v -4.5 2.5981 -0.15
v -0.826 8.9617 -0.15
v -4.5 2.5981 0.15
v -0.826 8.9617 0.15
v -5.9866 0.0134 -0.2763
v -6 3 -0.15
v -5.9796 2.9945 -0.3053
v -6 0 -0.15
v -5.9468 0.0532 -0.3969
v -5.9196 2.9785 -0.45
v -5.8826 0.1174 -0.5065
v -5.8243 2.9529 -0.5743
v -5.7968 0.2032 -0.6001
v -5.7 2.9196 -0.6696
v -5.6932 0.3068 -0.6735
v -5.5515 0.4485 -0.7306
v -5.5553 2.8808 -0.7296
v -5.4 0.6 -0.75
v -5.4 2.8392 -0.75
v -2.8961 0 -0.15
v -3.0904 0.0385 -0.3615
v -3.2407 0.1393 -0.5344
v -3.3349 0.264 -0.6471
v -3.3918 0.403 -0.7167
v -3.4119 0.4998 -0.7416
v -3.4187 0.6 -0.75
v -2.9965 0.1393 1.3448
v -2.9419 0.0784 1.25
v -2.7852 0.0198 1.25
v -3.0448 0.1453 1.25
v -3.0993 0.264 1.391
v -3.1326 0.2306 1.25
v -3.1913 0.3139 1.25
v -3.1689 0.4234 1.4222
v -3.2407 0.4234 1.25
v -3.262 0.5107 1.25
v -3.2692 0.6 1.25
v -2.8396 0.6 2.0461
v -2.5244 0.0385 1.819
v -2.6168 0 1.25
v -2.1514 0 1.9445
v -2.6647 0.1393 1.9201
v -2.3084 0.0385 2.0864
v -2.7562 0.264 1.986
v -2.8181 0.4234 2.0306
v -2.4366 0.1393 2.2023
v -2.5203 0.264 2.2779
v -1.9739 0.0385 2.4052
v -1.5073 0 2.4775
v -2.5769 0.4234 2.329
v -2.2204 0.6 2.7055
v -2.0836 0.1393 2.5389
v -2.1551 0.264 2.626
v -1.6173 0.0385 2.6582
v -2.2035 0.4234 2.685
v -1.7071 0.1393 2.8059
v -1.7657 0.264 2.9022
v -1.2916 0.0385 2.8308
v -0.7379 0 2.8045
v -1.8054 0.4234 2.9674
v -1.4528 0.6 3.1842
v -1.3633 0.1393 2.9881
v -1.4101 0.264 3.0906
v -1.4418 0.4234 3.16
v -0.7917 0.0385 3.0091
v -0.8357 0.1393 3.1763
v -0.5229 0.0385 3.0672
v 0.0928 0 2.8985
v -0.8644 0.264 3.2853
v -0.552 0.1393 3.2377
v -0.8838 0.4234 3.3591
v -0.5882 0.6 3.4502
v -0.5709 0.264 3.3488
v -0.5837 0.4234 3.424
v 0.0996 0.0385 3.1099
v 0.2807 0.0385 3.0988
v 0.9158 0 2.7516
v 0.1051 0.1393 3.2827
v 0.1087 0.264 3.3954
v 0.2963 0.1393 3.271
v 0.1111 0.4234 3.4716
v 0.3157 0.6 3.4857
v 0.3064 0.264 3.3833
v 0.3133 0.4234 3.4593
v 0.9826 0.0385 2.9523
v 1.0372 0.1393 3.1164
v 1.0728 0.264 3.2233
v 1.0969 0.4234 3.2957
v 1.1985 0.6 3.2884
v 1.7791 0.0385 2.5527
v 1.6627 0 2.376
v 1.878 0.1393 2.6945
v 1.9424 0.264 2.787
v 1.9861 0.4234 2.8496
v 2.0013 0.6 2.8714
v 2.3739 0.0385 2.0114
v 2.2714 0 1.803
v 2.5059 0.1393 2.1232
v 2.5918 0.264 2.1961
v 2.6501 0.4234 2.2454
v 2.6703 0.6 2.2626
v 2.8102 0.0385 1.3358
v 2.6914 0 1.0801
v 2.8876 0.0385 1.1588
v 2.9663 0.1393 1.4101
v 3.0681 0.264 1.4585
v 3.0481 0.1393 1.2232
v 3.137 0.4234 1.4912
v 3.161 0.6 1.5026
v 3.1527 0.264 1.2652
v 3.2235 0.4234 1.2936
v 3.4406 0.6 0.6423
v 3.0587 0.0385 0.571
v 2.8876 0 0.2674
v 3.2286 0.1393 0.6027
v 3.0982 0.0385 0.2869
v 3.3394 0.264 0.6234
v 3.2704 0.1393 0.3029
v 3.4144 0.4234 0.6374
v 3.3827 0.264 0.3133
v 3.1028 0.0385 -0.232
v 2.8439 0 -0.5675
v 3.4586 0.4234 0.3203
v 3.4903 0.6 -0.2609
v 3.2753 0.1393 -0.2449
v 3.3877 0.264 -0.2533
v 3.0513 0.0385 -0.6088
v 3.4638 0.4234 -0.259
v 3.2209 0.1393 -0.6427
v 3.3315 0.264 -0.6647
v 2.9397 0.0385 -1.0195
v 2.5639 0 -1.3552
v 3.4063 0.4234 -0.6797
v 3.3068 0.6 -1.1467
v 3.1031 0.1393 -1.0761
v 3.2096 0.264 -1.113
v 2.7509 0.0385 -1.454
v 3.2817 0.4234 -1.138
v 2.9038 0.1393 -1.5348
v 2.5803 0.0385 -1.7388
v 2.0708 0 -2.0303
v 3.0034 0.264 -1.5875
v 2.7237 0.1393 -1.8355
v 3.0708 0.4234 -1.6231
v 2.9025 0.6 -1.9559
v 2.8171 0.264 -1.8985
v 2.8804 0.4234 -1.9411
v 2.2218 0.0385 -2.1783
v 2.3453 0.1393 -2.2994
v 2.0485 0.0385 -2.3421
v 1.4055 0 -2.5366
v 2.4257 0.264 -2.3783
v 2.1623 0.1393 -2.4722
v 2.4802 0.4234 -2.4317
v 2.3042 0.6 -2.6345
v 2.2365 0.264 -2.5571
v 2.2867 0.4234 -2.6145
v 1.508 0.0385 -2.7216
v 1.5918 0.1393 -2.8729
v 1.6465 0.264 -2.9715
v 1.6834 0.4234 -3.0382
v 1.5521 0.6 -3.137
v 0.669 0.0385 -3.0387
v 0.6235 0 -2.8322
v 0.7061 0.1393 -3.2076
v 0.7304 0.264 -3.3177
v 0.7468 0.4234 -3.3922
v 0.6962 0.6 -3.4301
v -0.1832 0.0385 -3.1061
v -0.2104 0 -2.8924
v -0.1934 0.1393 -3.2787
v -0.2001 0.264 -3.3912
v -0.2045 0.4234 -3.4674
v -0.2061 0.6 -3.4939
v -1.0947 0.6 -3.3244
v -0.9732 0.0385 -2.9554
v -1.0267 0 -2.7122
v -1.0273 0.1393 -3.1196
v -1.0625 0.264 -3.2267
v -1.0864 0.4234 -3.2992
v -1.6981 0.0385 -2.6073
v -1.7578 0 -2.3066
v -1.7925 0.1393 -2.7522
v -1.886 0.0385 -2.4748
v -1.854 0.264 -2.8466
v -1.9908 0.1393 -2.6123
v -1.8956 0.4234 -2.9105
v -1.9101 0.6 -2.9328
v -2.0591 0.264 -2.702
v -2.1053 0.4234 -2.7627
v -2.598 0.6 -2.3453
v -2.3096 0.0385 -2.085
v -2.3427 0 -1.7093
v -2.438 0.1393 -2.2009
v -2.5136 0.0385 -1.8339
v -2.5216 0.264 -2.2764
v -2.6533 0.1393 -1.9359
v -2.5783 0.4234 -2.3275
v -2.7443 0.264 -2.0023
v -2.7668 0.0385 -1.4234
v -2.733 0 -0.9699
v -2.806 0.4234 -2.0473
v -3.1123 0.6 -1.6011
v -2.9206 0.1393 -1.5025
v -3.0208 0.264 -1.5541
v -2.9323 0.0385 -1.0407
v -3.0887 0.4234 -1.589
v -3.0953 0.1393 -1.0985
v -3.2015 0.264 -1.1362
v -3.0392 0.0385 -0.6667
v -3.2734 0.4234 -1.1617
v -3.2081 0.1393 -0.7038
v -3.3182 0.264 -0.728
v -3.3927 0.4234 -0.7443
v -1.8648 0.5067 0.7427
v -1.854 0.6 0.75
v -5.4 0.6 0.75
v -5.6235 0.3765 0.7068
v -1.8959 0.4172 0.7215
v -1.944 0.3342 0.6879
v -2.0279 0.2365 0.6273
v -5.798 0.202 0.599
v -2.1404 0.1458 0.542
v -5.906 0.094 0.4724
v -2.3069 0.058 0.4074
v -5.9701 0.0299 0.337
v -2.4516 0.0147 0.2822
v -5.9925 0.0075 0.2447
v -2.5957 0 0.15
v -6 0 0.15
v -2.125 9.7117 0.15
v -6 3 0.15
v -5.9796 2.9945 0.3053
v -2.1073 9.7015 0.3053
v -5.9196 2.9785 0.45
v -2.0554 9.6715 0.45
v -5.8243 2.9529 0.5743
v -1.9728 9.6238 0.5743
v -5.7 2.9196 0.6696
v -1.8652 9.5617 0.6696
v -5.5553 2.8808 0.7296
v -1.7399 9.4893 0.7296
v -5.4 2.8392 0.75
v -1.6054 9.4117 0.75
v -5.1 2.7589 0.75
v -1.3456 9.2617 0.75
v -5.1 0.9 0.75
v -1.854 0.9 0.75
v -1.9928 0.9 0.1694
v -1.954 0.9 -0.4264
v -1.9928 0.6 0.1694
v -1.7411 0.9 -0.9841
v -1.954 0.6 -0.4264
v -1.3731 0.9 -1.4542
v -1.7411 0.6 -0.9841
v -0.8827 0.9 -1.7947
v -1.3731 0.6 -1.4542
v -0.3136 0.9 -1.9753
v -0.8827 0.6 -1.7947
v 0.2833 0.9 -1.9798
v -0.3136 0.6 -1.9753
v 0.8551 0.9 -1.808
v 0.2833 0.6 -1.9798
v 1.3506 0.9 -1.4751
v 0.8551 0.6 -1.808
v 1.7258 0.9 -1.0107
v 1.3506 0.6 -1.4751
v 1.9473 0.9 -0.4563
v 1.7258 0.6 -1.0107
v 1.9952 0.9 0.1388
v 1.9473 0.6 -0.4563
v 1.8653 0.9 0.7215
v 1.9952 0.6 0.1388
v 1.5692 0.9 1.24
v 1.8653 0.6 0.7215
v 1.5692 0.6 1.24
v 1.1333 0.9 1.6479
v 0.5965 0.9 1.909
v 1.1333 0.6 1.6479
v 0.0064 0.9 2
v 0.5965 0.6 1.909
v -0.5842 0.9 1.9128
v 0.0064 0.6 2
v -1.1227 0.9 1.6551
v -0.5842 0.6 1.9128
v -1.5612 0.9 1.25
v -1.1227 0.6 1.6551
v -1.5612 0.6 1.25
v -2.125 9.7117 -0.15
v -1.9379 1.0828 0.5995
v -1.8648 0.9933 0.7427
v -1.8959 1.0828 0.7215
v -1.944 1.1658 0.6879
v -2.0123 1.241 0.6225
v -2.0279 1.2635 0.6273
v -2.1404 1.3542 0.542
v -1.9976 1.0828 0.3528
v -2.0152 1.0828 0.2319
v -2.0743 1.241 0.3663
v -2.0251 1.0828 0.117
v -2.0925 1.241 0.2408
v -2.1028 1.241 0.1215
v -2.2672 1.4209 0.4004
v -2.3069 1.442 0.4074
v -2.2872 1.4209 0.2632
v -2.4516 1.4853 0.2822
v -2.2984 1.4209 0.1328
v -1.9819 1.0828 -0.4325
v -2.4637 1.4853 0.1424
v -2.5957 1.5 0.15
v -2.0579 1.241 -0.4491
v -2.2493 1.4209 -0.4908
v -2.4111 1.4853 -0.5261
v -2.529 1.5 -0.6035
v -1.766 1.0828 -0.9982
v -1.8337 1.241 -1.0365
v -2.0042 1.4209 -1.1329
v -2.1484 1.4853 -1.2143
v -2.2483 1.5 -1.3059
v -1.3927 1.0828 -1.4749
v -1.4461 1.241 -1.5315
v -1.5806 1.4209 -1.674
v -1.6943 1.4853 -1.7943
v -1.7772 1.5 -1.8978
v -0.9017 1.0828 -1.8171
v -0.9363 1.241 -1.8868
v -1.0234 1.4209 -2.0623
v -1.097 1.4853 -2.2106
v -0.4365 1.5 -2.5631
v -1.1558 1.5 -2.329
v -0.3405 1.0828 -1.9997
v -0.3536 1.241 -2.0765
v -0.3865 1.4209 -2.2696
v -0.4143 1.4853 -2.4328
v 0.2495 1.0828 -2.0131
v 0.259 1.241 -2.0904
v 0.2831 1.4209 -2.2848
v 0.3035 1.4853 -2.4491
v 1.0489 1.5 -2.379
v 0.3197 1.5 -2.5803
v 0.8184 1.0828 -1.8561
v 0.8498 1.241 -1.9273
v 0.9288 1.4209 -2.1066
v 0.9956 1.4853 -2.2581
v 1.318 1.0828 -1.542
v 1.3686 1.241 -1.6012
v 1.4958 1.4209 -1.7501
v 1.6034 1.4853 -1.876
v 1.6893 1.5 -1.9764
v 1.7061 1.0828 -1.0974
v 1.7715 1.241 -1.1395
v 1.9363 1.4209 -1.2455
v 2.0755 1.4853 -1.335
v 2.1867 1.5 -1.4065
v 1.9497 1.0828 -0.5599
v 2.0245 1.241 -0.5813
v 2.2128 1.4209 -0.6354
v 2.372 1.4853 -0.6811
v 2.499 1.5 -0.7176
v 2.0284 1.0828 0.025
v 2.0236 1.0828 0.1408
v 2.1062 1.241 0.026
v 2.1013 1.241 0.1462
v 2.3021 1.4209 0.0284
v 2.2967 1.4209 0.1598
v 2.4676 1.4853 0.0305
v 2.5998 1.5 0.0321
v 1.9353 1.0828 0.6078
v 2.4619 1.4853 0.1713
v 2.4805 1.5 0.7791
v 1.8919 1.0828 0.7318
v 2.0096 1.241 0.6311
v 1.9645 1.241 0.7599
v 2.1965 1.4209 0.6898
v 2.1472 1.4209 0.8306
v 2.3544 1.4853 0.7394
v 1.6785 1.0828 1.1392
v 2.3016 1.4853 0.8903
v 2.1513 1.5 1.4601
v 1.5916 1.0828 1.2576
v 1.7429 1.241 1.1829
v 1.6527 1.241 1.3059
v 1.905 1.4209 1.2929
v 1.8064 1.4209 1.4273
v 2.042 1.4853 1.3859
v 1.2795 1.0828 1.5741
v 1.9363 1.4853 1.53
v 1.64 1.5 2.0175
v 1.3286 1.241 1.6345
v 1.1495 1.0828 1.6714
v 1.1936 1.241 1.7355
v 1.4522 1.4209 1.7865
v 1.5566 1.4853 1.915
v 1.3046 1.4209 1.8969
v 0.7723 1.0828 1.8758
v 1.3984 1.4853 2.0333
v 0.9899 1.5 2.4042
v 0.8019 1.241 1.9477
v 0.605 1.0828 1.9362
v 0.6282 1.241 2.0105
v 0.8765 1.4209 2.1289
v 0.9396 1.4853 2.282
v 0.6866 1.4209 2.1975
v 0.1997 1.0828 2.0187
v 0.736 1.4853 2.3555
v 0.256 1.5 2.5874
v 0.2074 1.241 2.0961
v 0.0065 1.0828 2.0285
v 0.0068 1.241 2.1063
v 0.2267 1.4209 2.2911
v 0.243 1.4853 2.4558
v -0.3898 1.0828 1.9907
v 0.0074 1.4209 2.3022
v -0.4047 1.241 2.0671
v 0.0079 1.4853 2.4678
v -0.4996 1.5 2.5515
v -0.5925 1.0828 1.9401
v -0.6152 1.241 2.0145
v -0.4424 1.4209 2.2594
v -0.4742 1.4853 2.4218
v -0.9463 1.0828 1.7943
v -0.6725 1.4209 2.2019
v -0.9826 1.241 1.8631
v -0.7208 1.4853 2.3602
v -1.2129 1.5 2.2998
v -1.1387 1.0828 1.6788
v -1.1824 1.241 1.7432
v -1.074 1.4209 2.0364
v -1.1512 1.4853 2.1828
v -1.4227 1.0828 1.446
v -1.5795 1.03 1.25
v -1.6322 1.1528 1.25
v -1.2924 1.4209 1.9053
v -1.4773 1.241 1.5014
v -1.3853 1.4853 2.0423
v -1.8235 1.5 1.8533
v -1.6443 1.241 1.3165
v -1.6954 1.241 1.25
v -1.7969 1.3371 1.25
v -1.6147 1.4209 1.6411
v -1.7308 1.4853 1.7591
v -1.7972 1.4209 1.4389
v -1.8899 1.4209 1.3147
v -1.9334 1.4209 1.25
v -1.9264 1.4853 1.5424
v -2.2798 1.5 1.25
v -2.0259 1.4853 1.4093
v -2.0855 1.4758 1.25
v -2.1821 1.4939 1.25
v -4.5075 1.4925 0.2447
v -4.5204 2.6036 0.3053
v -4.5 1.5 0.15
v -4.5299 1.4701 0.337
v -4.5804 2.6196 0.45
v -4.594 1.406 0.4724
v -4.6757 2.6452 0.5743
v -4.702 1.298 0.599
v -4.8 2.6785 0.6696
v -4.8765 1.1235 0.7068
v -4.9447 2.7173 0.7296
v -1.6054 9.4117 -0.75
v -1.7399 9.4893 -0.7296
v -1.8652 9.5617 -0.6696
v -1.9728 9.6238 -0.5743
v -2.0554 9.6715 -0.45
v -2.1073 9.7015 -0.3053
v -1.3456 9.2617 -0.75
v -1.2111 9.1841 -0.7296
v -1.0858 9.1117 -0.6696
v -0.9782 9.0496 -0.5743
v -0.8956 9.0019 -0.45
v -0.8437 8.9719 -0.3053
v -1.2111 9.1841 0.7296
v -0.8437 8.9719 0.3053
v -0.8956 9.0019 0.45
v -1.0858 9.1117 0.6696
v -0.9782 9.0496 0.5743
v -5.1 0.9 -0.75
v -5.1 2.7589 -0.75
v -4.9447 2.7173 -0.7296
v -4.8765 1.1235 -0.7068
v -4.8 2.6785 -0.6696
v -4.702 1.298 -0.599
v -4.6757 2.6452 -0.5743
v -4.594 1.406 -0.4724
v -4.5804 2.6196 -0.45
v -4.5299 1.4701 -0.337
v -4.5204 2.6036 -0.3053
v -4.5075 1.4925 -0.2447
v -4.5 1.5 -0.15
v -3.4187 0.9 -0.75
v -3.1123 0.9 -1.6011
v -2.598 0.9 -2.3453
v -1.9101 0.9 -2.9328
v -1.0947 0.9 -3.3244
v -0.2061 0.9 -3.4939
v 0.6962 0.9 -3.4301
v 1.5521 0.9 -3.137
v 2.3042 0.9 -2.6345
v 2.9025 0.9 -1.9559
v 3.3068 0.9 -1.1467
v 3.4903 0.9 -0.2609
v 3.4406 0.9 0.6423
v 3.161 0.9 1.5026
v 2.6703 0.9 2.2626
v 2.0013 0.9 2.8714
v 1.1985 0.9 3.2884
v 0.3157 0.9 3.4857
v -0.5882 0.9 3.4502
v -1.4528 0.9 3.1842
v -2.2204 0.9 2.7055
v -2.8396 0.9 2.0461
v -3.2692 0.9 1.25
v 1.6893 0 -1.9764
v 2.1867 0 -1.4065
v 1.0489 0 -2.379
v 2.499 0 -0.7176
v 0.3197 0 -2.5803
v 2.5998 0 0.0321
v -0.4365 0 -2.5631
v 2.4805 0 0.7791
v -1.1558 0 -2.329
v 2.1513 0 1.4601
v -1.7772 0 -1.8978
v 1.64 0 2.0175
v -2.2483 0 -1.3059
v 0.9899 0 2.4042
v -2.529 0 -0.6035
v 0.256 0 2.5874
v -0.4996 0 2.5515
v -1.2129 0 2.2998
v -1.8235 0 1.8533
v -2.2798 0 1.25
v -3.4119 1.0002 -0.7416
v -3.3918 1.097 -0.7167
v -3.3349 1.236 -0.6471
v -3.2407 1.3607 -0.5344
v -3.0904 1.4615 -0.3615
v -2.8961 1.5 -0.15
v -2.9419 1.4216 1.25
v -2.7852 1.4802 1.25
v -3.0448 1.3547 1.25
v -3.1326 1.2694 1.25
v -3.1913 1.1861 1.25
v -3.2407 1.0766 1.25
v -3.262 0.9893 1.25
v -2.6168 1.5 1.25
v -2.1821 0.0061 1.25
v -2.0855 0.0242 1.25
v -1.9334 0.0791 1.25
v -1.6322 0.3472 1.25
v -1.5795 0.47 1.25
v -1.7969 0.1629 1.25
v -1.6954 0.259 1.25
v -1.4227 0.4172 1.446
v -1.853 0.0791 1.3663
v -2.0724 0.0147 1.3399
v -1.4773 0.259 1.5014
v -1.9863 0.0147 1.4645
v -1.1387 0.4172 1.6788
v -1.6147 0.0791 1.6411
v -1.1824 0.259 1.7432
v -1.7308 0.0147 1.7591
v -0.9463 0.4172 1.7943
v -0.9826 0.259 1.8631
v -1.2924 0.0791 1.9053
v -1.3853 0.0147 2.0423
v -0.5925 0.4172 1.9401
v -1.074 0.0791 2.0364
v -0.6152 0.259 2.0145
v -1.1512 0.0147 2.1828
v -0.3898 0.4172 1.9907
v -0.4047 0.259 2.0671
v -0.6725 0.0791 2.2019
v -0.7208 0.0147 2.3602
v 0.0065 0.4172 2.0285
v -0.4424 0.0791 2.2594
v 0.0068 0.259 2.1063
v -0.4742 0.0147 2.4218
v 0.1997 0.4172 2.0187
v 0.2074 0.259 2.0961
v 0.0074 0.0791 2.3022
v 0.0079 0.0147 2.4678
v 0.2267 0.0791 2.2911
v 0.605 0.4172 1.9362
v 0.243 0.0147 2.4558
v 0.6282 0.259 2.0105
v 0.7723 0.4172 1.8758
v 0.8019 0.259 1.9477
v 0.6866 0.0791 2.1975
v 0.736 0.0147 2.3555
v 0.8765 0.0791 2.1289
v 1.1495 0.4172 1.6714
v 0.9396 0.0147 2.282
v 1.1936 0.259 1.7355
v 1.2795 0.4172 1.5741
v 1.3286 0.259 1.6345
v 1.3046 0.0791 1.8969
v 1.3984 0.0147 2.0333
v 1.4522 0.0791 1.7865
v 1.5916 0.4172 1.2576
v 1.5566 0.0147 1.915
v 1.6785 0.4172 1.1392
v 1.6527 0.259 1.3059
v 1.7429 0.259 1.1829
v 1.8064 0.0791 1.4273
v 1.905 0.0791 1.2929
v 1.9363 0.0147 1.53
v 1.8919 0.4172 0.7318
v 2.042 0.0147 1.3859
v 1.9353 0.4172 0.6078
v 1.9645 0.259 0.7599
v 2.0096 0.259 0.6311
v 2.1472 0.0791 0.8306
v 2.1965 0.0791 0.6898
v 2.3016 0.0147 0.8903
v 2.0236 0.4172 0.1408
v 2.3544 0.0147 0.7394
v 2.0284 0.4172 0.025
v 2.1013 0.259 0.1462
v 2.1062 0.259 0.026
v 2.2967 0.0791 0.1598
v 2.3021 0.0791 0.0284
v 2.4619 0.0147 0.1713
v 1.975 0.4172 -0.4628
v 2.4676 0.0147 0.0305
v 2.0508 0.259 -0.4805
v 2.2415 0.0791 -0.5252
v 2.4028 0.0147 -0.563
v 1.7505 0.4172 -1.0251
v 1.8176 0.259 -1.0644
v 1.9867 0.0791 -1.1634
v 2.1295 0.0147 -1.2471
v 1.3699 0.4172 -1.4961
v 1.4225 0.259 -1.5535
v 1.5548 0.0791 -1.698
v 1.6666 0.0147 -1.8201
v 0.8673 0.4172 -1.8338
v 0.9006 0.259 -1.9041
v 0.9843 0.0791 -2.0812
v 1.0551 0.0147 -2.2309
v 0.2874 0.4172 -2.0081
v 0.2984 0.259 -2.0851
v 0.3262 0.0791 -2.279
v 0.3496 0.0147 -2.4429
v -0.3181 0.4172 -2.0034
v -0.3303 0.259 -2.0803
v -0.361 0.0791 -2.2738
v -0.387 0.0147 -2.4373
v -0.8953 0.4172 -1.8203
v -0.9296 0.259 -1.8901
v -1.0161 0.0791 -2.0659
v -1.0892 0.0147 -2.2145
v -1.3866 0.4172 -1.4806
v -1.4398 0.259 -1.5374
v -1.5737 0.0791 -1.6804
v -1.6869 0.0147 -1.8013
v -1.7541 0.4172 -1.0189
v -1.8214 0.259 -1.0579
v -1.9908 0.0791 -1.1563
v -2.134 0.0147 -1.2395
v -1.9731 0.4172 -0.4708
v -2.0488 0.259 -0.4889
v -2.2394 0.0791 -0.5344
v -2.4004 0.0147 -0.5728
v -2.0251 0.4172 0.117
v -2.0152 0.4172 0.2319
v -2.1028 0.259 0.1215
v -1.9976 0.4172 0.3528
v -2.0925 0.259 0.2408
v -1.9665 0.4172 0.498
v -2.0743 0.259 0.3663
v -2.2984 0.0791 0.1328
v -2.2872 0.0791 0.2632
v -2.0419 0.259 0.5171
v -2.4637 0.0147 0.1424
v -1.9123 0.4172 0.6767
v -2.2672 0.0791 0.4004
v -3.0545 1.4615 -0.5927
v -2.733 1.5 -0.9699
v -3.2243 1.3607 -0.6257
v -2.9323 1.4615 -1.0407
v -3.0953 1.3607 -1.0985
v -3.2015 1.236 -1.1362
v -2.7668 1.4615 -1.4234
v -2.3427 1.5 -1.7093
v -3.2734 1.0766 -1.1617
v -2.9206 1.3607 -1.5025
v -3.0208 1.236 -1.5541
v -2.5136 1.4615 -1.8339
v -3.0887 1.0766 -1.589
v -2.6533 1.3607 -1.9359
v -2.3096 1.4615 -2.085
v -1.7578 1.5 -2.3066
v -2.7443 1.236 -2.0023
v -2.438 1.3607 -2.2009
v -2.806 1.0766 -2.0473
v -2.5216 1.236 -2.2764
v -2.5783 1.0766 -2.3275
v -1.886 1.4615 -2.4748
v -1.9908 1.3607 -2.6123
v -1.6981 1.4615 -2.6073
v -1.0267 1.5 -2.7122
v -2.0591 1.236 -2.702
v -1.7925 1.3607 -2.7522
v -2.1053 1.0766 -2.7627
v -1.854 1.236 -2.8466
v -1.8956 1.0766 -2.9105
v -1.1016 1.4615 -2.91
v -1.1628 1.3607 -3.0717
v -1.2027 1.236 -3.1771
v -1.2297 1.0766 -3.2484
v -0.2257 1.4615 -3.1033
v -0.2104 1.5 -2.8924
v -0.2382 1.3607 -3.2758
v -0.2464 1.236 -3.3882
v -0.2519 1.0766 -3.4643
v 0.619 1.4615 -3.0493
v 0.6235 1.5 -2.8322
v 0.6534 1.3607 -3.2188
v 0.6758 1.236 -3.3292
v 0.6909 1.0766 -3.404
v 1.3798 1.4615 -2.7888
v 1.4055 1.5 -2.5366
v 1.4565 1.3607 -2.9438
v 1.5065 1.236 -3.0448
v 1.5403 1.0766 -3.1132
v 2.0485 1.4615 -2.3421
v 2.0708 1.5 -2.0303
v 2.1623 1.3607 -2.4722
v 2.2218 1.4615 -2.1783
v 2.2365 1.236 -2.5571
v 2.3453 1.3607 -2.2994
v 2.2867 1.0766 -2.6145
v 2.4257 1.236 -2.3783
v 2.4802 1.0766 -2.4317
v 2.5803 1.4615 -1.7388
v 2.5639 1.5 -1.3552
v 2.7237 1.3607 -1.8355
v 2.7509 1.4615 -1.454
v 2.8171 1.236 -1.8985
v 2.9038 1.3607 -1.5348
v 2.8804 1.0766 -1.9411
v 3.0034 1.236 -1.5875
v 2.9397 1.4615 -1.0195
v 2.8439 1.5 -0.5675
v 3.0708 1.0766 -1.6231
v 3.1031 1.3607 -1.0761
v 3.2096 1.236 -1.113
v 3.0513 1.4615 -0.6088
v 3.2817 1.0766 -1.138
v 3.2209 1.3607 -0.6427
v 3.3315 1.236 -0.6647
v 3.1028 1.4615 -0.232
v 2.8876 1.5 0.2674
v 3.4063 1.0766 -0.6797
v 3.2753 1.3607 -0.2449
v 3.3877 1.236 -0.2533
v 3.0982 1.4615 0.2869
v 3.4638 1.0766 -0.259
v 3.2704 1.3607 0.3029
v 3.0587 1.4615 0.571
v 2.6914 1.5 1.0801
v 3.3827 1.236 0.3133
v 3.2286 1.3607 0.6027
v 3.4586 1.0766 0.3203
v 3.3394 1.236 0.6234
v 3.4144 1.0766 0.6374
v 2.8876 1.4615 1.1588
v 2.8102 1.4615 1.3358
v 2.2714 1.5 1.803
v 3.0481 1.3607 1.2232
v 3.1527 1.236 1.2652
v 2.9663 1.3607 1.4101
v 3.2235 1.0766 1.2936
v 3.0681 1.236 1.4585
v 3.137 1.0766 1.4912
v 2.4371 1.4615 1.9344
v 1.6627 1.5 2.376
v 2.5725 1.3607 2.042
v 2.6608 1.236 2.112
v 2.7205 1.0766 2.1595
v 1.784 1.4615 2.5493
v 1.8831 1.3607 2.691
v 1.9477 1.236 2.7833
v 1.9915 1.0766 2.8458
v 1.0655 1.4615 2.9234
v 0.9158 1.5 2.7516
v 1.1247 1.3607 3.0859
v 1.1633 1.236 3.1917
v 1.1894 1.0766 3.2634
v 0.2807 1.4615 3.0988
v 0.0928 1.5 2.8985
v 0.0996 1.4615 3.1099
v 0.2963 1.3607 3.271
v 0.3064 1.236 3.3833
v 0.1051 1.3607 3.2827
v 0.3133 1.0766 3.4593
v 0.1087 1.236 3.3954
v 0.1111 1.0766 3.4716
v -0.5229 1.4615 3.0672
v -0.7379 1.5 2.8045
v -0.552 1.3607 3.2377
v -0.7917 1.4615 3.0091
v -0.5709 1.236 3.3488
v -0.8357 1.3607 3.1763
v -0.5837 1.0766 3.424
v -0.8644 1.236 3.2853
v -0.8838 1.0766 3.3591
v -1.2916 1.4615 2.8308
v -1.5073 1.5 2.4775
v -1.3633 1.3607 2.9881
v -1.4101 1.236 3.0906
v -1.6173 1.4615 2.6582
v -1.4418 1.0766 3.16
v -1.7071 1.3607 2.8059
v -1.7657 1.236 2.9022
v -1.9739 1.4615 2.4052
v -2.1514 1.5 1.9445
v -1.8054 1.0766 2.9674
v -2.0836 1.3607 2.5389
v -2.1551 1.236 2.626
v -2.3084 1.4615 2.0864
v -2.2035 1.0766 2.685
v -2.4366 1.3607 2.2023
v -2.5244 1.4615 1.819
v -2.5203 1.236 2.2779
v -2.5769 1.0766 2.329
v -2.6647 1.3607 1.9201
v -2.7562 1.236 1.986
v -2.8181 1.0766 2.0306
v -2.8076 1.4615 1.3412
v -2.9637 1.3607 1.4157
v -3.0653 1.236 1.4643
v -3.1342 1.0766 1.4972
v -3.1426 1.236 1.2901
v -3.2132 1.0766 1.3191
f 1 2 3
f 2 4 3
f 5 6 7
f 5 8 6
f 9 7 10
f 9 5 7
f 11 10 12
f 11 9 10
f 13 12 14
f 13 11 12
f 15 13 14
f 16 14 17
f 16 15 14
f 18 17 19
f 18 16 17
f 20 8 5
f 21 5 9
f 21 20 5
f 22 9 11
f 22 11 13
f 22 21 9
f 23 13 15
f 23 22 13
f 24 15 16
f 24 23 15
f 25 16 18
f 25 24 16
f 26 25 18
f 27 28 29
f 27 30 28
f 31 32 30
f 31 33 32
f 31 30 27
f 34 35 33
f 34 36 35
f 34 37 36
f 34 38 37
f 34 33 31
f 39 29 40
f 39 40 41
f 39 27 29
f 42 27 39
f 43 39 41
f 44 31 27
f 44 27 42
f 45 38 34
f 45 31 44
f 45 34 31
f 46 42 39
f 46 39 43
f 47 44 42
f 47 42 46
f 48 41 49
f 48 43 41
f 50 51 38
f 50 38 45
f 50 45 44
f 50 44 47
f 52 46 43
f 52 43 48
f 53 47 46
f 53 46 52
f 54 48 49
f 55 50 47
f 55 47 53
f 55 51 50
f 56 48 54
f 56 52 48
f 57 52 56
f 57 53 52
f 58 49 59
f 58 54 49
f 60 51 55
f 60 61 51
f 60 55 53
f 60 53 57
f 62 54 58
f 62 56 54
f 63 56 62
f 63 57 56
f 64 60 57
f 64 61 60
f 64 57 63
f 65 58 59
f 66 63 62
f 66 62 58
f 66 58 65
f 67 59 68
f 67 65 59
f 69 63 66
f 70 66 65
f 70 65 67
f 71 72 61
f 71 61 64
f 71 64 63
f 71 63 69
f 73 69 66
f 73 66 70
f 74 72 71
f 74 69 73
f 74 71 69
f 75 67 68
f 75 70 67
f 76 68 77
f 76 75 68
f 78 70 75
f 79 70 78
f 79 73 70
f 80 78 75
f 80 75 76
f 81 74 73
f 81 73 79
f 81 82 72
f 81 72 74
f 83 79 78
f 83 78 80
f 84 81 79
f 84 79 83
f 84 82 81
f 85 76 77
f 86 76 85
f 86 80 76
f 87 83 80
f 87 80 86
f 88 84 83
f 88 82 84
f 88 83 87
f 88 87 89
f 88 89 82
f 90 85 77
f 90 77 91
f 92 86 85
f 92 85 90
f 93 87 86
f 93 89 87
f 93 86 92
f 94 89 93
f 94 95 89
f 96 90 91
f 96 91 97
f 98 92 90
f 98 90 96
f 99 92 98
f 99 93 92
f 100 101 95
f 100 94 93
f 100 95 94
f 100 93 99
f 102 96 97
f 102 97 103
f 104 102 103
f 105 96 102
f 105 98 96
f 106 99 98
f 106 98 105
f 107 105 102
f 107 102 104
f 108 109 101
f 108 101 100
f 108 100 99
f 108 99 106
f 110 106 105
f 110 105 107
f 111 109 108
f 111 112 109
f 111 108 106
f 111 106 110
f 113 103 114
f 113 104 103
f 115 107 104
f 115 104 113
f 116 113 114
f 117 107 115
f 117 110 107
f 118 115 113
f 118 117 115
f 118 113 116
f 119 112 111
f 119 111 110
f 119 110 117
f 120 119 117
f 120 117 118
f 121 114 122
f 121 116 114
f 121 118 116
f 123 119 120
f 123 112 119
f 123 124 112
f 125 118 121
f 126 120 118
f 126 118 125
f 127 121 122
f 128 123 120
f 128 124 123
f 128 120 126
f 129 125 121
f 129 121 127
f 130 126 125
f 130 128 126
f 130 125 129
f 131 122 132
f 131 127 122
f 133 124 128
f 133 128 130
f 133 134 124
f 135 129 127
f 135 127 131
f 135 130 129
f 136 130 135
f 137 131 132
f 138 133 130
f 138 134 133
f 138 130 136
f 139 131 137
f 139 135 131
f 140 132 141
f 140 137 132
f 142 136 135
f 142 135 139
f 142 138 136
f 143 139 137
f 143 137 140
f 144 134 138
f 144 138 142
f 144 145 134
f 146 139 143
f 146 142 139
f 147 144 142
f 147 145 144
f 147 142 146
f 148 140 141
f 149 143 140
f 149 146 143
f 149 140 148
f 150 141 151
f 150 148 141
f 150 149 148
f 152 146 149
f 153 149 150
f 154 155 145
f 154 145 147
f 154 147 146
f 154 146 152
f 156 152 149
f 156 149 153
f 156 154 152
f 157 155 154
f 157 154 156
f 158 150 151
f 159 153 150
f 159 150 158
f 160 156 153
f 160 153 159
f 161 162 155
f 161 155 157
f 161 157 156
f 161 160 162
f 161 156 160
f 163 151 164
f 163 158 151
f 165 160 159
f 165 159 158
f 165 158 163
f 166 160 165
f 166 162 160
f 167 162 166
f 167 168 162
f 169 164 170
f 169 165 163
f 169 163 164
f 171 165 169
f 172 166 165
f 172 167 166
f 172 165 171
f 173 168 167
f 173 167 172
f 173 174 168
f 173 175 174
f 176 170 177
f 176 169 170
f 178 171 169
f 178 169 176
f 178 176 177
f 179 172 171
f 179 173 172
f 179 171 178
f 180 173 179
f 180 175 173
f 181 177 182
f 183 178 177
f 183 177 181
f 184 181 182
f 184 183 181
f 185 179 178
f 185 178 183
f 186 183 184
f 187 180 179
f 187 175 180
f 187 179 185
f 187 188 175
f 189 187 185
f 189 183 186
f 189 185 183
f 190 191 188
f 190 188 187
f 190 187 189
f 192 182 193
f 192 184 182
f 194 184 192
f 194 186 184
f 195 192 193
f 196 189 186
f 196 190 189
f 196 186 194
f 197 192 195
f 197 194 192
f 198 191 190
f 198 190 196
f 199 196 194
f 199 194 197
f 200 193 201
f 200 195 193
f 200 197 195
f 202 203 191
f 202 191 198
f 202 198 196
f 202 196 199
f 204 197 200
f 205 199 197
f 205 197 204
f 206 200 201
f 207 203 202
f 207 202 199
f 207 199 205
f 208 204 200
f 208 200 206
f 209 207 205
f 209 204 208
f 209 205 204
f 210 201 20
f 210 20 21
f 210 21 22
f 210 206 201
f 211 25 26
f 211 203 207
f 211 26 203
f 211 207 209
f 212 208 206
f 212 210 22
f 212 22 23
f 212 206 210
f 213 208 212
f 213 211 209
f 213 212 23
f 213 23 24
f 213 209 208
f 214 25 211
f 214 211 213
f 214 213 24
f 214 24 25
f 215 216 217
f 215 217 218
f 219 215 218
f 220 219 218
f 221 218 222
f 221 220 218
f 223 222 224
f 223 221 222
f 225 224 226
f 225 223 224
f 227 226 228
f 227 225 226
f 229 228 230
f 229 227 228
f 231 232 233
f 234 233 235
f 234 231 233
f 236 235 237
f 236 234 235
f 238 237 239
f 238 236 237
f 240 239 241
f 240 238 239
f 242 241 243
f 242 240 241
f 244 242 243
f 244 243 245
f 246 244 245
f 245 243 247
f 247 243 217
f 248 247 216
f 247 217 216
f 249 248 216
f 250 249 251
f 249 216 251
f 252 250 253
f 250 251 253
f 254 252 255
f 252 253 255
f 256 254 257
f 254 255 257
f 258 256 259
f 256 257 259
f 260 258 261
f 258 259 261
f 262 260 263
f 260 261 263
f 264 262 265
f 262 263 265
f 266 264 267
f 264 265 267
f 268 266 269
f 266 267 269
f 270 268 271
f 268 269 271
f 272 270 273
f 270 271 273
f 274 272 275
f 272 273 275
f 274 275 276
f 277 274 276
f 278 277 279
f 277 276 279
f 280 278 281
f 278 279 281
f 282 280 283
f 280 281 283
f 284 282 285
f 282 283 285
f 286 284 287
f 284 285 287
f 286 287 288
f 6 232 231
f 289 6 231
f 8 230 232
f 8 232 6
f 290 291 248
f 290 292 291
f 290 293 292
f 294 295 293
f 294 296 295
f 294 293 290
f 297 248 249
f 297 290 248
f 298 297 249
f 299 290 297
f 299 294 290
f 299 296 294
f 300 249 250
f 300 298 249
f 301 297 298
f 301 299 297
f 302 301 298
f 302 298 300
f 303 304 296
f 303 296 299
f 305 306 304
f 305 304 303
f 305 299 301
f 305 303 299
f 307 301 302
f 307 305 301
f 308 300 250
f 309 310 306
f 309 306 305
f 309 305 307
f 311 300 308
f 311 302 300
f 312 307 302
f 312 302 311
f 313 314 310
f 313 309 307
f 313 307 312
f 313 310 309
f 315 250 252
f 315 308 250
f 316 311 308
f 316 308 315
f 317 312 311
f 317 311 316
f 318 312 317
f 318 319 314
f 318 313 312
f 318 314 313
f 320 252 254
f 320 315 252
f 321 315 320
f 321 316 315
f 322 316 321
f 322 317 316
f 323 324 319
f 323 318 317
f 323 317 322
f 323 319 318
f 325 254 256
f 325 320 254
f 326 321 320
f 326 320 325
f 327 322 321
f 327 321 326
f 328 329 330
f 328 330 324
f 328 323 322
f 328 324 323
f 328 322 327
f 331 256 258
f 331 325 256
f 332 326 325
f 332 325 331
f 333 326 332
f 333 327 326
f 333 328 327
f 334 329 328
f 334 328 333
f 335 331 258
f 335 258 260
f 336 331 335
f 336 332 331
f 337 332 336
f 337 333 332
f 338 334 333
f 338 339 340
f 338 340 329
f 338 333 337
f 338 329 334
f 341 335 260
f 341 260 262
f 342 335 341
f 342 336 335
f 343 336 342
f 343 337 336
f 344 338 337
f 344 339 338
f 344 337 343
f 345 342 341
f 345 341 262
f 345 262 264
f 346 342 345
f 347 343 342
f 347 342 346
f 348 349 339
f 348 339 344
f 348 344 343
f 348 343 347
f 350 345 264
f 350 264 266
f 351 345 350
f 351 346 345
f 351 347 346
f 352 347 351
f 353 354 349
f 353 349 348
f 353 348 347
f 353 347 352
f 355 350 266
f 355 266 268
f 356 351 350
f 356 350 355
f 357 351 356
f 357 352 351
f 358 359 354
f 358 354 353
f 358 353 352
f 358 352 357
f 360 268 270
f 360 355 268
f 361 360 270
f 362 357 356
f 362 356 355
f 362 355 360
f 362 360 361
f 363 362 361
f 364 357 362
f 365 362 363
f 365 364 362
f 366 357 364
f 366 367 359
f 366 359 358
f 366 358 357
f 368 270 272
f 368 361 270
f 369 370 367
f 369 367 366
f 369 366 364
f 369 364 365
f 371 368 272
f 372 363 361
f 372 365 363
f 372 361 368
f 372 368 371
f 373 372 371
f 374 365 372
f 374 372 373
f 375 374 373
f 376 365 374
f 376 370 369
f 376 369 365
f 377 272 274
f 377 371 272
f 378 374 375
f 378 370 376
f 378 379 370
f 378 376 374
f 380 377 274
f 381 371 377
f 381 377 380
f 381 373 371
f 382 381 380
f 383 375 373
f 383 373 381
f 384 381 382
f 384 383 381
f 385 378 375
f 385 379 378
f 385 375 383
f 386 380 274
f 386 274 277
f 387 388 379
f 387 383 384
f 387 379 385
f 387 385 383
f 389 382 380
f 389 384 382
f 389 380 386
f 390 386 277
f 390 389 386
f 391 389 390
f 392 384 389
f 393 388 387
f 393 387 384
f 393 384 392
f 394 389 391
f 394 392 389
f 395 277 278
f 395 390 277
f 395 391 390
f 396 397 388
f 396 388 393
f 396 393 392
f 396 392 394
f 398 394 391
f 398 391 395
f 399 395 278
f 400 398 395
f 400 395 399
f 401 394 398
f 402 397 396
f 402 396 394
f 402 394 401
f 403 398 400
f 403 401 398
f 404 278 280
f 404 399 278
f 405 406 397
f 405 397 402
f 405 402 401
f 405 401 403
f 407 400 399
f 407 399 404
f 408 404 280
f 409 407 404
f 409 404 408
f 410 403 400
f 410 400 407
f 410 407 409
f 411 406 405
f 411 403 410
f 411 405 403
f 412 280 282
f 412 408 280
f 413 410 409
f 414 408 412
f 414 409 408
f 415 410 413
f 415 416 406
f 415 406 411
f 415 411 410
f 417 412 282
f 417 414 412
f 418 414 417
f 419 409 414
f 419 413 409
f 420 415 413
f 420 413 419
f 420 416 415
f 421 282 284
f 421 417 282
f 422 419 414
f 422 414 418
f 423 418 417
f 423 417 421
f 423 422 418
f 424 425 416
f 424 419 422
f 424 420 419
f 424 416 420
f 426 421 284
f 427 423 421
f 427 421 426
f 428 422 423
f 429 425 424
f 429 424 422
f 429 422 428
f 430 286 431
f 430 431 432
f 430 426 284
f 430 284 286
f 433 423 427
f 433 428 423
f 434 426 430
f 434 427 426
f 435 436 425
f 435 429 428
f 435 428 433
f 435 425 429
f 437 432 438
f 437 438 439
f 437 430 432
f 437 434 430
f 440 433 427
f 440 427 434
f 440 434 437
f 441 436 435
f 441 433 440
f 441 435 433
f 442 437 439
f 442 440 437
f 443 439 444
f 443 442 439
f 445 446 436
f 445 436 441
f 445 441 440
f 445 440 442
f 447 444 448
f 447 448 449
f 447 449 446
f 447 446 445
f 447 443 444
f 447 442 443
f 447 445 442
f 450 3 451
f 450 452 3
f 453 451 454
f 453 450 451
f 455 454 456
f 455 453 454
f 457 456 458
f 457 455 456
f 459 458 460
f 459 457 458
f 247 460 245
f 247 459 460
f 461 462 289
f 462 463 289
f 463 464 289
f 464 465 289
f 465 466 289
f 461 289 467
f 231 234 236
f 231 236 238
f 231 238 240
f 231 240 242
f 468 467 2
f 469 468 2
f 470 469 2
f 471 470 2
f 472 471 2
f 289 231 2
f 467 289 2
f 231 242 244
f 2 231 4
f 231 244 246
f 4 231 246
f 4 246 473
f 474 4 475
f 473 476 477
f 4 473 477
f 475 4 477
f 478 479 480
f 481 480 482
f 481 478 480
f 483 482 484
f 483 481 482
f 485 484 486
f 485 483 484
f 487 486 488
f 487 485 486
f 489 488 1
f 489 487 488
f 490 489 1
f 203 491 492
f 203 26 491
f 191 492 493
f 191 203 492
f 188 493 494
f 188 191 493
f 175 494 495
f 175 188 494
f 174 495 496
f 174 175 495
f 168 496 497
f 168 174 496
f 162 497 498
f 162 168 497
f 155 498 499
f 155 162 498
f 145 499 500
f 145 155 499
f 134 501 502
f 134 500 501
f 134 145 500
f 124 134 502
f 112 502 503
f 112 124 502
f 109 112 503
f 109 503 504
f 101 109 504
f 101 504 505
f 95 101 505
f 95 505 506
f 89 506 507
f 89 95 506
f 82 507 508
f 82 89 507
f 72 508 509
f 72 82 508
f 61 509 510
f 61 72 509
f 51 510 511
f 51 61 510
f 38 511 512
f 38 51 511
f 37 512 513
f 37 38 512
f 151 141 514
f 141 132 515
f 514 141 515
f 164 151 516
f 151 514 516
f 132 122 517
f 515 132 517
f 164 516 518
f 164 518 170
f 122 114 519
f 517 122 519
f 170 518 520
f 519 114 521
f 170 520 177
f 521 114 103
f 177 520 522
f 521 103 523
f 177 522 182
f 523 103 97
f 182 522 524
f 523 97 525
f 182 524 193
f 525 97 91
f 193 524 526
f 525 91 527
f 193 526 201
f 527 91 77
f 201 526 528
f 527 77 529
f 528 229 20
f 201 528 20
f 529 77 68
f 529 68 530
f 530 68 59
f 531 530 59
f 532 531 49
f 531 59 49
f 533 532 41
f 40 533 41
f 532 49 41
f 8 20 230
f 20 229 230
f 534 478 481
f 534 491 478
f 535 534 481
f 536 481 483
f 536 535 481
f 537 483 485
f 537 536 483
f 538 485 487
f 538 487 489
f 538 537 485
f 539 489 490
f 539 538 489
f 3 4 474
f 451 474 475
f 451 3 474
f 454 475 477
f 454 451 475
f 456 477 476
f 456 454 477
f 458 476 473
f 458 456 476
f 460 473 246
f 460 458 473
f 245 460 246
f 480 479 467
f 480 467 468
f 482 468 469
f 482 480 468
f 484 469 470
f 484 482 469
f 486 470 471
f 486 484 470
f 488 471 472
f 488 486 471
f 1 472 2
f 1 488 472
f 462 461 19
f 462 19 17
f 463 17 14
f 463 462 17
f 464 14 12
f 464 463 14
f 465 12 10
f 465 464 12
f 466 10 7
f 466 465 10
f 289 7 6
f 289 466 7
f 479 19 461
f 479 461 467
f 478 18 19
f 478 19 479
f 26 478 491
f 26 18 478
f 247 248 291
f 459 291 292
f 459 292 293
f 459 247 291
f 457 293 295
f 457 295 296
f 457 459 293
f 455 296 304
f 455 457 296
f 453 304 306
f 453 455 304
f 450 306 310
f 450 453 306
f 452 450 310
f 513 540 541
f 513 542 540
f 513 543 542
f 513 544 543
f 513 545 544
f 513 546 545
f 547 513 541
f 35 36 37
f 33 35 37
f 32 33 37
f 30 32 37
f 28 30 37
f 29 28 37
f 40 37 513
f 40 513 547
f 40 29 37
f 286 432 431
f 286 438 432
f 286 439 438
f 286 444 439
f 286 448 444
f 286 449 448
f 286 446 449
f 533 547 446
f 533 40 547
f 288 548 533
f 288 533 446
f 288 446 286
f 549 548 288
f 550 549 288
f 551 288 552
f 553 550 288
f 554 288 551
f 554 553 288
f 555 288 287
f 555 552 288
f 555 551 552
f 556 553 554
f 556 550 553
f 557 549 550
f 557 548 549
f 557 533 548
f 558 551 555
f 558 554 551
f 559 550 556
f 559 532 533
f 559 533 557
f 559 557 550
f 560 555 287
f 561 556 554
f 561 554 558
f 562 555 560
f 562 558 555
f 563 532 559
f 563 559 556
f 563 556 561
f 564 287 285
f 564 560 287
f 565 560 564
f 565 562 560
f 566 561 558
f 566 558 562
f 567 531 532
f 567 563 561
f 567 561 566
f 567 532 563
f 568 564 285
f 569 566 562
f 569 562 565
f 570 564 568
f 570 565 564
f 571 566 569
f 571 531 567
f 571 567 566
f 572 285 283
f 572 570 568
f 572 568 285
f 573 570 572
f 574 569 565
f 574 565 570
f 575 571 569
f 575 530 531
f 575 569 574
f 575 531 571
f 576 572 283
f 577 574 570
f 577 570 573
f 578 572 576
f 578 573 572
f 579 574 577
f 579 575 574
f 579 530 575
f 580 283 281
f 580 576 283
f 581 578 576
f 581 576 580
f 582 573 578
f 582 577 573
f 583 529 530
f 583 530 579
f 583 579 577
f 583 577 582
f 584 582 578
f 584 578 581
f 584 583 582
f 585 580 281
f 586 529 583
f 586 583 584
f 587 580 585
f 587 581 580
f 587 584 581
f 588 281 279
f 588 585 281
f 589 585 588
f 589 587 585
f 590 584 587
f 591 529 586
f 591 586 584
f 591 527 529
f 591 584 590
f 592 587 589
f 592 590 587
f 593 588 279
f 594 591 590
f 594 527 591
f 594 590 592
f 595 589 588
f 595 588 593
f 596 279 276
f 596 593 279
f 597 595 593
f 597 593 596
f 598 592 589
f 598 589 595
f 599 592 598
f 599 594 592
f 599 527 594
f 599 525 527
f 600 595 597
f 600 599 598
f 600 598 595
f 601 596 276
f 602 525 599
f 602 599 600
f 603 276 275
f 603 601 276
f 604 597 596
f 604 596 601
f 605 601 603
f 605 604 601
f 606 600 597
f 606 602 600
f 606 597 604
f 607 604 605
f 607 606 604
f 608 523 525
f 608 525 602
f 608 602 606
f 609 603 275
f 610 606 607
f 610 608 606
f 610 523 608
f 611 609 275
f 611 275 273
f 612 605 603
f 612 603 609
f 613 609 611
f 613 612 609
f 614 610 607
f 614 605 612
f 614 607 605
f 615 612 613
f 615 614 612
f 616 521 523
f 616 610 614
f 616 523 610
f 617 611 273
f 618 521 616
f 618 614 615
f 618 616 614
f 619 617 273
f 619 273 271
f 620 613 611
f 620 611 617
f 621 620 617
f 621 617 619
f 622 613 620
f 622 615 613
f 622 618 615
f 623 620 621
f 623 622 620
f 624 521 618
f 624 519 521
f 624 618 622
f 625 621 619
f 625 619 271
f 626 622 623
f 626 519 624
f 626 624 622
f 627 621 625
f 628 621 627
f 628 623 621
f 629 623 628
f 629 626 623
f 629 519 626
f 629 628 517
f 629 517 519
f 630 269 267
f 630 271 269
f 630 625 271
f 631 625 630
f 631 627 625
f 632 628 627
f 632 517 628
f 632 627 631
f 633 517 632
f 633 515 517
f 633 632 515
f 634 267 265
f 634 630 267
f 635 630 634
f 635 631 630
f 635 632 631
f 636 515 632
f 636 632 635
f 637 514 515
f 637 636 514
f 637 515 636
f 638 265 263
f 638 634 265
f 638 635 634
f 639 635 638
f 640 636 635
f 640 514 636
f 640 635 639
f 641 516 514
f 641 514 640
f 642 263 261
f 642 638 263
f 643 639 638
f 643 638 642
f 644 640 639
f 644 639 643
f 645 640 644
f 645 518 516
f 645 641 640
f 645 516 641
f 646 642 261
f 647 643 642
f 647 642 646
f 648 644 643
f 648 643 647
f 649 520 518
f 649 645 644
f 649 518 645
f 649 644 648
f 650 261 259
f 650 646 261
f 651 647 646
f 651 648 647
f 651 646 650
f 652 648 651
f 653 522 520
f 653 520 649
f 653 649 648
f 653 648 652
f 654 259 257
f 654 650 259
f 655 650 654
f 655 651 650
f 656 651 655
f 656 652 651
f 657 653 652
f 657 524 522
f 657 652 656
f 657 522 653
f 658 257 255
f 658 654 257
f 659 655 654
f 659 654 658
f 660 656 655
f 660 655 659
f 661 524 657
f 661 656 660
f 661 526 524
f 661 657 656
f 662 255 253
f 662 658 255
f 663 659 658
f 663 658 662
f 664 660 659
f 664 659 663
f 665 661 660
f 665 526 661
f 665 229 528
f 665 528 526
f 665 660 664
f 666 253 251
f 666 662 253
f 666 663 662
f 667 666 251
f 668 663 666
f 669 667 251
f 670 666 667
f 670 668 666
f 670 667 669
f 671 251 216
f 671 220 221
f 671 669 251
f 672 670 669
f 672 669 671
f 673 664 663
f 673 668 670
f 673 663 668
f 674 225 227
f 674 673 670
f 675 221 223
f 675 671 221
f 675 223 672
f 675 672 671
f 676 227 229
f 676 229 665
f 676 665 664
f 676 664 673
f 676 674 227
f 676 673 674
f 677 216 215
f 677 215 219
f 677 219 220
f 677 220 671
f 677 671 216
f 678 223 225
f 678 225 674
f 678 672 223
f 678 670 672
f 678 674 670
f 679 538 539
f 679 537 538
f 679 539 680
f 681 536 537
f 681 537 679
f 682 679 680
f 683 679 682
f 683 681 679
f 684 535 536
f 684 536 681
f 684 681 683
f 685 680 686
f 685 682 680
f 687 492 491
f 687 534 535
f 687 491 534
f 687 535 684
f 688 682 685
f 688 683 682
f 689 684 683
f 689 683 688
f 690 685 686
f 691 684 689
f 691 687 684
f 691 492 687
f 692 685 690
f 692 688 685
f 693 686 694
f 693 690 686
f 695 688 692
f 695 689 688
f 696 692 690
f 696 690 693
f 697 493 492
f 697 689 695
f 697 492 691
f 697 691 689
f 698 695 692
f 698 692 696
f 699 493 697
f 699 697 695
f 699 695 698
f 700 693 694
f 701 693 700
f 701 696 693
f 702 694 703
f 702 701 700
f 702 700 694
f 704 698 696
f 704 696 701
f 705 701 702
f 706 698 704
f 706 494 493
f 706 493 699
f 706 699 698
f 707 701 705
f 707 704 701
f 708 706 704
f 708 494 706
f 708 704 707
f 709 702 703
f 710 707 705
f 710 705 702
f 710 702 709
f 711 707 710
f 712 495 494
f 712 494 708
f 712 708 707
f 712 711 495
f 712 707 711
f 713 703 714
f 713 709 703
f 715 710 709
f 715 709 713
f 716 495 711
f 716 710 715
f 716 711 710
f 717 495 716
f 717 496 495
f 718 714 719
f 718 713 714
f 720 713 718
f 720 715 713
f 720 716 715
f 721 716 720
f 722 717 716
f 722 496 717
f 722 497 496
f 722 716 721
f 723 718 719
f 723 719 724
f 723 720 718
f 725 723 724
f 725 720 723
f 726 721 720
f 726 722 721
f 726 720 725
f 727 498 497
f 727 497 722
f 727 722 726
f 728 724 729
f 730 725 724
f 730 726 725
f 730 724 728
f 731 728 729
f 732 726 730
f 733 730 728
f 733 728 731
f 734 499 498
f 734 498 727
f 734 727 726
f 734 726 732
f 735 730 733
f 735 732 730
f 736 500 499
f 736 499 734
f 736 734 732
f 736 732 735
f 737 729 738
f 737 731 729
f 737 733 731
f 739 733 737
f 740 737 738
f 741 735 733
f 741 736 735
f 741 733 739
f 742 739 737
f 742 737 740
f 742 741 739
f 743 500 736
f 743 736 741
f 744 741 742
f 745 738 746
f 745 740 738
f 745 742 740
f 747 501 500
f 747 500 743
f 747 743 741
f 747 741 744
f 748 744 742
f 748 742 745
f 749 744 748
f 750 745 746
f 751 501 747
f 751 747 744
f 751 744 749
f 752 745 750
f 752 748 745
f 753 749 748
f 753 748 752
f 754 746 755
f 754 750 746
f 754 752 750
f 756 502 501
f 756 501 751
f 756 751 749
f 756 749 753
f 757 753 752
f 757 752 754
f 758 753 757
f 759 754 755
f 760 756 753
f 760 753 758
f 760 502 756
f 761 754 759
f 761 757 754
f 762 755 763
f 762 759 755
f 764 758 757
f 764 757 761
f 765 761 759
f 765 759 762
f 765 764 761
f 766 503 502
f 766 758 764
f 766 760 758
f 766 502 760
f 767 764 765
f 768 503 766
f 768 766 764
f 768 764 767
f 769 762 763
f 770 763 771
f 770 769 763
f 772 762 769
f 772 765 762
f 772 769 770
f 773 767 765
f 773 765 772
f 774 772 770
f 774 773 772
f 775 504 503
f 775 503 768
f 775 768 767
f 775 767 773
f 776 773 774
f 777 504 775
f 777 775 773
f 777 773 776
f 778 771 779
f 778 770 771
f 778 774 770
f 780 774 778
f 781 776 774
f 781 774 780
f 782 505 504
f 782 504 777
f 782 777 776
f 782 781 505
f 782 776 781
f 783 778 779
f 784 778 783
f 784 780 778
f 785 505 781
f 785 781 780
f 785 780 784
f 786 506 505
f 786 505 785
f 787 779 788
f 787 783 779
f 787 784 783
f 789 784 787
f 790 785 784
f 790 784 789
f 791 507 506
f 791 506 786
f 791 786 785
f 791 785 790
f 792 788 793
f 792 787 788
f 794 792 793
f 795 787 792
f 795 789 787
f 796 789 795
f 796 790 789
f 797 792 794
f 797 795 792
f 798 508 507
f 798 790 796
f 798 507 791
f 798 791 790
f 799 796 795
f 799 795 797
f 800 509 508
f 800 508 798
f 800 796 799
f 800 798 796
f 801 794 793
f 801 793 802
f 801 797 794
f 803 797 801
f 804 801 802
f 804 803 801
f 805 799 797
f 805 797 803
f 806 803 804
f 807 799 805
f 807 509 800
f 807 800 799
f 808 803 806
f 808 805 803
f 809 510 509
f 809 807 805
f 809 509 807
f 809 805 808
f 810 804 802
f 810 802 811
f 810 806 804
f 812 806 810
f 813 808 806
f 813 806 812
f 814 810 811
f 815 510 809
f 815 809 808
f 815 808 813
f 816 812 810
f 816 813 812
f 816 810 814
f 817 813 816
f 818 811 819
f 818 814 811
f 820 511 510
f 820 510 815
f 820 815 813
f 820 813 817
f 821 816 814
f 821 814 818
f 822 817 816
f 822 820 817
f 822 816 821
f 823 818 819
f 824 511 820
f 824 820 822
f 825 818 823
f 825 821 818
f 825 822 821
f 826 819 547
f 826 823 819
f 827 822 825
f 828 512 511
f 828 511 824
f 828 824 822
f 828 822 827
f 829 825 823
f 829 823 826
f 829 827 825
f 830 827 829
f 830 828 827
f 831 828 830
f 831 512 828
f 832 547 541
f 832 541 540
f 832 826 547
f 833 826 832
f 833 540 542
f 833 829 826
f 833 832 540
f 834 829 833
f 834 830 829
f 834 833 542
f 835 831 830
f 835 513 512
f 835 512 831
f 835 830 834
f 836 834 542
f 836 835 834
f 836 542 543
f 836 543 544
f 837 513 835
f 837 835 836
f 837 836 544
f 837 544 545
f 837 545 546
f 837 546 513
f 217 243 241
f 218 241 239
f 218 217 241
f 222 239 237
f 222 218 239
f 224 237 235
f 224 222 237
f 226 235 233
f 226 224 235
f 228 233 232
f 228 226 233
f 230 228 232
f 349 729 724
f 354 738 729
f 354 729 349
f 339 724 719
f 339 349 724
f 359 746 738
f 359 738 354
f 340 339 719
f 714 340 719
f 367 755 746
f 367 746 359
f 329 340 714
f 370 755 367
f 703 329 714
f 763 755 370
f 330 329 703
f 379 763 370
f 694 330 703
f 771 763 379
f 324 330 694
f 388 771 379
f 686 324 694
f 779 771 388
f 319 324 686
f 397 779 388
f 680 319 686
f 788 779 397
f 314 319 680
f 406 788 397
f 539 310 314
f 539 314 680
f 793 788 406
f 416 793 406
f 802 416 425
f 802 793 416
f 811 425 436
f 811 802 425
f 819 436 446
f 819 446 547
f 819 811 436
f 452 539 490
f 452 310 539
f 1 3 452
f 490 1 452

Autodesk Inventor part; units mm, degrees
ref_plane "YZ Plane" through (0, 0, 0) normal (1, 0, 0) x (0, 1, 0)
ref_plane "XZ Plane" through (0, 0, 0) normal (0, 1, 0) x (-1, 0, 0)
sketch "Sketch1" plane through (0, 0, 0) normal (0, 1, 0) x (-1, 0, 0)
  circle A0 centre (0, 0) radius 2
  circle A1 centre (0, 0) radius 3.5
  line L0 (6, 0.75) -> (3.4187, 0.75)
  line L1 (6, 0.75) -> (6, -0.75)
  line L2 (6, -0.75) -> (3.4187, -0.75)
  line L3 (3.4187, 0.75) -> (1.854, 0.75)
  line L4 (3.2692, 1.25) -> (1.5612, 1.25)
  dimension "d0" = 4
  dimension "d1" = 1.5
  dimension "d2" = 0.75
  dimension "d3" = 0.75
  dimension "d4" = 6
  dimension "d5" = 0.5
extrude "Extrusion1" add sketch "Sketch1" along normal blind 1.5 contours A0 L3 A1 L4 | L0 L1 L2 A1 picked at (2.5643, 1.5047)
ref_plane "Work Plane1" through (-6, 0.6, 0.75) normal (0, 0, 1) x (1, 0, 0)
sketch "Sketch2" plane through (-6, 0.6, 0.75) normal (0, 0, 1) x (1, 0, 0)
  line L0 (0, 0.9) -> (0, 2.4)
  line L1 (0, 2.4) -> (1.5, 2.4)
  line L2 (1.5, 2.4) -> (1.5, 0.9)
  line L3 (0, 2.4) -> (3.875, 9.1117)
  line L4 (3.875, 9.1117) -> (5.174, 8.3617)
  line L5 (5.174, 8.3617) -> (1.5, 1.9981)
  line L6 (0, 0.9) -> (4.146, 0.9) projected
  point P0 (6, -0.6)
  dimension "d9" = 1.5
  dimension "d15" = 1.5
  dimension "d16" = 7
  dimension "d17" = 1.5
  dimension "d18" = 60
extrude "Extrusion2" add sketch "Sketch2" against normal blind 1.5
fillet "Fillet2" radius 0.6 16 edges at (3.4903, 1.5, -0.2609) (1.7259, 1.5, -1.0107) (1.7259, 0, -1.0107) (3.4903, 0, -0.2609) (-3.927, 0, 0.75) (-4.7093, 0, -0.75) (-3.177, 1.5, 0.75) (-6, 1.5, 0.75) (-6, 1.5, -0.75) (-4.0625, 6.3558, 0.75) (-4.0625, 6.3558, -0.75) (-4.5, 2.049, 0.75) (-4.5, 2.049, -0.75) (-2.663, 5.7799, 0.75) (-2.663, 5.7799, -0.75) (-3.9593, 1.5, -0.75)
equation "\"d3\" = d2"
properties part number "CUT_COPPER_Bottom_Cone_1,5mm_Connecting_Wire"
